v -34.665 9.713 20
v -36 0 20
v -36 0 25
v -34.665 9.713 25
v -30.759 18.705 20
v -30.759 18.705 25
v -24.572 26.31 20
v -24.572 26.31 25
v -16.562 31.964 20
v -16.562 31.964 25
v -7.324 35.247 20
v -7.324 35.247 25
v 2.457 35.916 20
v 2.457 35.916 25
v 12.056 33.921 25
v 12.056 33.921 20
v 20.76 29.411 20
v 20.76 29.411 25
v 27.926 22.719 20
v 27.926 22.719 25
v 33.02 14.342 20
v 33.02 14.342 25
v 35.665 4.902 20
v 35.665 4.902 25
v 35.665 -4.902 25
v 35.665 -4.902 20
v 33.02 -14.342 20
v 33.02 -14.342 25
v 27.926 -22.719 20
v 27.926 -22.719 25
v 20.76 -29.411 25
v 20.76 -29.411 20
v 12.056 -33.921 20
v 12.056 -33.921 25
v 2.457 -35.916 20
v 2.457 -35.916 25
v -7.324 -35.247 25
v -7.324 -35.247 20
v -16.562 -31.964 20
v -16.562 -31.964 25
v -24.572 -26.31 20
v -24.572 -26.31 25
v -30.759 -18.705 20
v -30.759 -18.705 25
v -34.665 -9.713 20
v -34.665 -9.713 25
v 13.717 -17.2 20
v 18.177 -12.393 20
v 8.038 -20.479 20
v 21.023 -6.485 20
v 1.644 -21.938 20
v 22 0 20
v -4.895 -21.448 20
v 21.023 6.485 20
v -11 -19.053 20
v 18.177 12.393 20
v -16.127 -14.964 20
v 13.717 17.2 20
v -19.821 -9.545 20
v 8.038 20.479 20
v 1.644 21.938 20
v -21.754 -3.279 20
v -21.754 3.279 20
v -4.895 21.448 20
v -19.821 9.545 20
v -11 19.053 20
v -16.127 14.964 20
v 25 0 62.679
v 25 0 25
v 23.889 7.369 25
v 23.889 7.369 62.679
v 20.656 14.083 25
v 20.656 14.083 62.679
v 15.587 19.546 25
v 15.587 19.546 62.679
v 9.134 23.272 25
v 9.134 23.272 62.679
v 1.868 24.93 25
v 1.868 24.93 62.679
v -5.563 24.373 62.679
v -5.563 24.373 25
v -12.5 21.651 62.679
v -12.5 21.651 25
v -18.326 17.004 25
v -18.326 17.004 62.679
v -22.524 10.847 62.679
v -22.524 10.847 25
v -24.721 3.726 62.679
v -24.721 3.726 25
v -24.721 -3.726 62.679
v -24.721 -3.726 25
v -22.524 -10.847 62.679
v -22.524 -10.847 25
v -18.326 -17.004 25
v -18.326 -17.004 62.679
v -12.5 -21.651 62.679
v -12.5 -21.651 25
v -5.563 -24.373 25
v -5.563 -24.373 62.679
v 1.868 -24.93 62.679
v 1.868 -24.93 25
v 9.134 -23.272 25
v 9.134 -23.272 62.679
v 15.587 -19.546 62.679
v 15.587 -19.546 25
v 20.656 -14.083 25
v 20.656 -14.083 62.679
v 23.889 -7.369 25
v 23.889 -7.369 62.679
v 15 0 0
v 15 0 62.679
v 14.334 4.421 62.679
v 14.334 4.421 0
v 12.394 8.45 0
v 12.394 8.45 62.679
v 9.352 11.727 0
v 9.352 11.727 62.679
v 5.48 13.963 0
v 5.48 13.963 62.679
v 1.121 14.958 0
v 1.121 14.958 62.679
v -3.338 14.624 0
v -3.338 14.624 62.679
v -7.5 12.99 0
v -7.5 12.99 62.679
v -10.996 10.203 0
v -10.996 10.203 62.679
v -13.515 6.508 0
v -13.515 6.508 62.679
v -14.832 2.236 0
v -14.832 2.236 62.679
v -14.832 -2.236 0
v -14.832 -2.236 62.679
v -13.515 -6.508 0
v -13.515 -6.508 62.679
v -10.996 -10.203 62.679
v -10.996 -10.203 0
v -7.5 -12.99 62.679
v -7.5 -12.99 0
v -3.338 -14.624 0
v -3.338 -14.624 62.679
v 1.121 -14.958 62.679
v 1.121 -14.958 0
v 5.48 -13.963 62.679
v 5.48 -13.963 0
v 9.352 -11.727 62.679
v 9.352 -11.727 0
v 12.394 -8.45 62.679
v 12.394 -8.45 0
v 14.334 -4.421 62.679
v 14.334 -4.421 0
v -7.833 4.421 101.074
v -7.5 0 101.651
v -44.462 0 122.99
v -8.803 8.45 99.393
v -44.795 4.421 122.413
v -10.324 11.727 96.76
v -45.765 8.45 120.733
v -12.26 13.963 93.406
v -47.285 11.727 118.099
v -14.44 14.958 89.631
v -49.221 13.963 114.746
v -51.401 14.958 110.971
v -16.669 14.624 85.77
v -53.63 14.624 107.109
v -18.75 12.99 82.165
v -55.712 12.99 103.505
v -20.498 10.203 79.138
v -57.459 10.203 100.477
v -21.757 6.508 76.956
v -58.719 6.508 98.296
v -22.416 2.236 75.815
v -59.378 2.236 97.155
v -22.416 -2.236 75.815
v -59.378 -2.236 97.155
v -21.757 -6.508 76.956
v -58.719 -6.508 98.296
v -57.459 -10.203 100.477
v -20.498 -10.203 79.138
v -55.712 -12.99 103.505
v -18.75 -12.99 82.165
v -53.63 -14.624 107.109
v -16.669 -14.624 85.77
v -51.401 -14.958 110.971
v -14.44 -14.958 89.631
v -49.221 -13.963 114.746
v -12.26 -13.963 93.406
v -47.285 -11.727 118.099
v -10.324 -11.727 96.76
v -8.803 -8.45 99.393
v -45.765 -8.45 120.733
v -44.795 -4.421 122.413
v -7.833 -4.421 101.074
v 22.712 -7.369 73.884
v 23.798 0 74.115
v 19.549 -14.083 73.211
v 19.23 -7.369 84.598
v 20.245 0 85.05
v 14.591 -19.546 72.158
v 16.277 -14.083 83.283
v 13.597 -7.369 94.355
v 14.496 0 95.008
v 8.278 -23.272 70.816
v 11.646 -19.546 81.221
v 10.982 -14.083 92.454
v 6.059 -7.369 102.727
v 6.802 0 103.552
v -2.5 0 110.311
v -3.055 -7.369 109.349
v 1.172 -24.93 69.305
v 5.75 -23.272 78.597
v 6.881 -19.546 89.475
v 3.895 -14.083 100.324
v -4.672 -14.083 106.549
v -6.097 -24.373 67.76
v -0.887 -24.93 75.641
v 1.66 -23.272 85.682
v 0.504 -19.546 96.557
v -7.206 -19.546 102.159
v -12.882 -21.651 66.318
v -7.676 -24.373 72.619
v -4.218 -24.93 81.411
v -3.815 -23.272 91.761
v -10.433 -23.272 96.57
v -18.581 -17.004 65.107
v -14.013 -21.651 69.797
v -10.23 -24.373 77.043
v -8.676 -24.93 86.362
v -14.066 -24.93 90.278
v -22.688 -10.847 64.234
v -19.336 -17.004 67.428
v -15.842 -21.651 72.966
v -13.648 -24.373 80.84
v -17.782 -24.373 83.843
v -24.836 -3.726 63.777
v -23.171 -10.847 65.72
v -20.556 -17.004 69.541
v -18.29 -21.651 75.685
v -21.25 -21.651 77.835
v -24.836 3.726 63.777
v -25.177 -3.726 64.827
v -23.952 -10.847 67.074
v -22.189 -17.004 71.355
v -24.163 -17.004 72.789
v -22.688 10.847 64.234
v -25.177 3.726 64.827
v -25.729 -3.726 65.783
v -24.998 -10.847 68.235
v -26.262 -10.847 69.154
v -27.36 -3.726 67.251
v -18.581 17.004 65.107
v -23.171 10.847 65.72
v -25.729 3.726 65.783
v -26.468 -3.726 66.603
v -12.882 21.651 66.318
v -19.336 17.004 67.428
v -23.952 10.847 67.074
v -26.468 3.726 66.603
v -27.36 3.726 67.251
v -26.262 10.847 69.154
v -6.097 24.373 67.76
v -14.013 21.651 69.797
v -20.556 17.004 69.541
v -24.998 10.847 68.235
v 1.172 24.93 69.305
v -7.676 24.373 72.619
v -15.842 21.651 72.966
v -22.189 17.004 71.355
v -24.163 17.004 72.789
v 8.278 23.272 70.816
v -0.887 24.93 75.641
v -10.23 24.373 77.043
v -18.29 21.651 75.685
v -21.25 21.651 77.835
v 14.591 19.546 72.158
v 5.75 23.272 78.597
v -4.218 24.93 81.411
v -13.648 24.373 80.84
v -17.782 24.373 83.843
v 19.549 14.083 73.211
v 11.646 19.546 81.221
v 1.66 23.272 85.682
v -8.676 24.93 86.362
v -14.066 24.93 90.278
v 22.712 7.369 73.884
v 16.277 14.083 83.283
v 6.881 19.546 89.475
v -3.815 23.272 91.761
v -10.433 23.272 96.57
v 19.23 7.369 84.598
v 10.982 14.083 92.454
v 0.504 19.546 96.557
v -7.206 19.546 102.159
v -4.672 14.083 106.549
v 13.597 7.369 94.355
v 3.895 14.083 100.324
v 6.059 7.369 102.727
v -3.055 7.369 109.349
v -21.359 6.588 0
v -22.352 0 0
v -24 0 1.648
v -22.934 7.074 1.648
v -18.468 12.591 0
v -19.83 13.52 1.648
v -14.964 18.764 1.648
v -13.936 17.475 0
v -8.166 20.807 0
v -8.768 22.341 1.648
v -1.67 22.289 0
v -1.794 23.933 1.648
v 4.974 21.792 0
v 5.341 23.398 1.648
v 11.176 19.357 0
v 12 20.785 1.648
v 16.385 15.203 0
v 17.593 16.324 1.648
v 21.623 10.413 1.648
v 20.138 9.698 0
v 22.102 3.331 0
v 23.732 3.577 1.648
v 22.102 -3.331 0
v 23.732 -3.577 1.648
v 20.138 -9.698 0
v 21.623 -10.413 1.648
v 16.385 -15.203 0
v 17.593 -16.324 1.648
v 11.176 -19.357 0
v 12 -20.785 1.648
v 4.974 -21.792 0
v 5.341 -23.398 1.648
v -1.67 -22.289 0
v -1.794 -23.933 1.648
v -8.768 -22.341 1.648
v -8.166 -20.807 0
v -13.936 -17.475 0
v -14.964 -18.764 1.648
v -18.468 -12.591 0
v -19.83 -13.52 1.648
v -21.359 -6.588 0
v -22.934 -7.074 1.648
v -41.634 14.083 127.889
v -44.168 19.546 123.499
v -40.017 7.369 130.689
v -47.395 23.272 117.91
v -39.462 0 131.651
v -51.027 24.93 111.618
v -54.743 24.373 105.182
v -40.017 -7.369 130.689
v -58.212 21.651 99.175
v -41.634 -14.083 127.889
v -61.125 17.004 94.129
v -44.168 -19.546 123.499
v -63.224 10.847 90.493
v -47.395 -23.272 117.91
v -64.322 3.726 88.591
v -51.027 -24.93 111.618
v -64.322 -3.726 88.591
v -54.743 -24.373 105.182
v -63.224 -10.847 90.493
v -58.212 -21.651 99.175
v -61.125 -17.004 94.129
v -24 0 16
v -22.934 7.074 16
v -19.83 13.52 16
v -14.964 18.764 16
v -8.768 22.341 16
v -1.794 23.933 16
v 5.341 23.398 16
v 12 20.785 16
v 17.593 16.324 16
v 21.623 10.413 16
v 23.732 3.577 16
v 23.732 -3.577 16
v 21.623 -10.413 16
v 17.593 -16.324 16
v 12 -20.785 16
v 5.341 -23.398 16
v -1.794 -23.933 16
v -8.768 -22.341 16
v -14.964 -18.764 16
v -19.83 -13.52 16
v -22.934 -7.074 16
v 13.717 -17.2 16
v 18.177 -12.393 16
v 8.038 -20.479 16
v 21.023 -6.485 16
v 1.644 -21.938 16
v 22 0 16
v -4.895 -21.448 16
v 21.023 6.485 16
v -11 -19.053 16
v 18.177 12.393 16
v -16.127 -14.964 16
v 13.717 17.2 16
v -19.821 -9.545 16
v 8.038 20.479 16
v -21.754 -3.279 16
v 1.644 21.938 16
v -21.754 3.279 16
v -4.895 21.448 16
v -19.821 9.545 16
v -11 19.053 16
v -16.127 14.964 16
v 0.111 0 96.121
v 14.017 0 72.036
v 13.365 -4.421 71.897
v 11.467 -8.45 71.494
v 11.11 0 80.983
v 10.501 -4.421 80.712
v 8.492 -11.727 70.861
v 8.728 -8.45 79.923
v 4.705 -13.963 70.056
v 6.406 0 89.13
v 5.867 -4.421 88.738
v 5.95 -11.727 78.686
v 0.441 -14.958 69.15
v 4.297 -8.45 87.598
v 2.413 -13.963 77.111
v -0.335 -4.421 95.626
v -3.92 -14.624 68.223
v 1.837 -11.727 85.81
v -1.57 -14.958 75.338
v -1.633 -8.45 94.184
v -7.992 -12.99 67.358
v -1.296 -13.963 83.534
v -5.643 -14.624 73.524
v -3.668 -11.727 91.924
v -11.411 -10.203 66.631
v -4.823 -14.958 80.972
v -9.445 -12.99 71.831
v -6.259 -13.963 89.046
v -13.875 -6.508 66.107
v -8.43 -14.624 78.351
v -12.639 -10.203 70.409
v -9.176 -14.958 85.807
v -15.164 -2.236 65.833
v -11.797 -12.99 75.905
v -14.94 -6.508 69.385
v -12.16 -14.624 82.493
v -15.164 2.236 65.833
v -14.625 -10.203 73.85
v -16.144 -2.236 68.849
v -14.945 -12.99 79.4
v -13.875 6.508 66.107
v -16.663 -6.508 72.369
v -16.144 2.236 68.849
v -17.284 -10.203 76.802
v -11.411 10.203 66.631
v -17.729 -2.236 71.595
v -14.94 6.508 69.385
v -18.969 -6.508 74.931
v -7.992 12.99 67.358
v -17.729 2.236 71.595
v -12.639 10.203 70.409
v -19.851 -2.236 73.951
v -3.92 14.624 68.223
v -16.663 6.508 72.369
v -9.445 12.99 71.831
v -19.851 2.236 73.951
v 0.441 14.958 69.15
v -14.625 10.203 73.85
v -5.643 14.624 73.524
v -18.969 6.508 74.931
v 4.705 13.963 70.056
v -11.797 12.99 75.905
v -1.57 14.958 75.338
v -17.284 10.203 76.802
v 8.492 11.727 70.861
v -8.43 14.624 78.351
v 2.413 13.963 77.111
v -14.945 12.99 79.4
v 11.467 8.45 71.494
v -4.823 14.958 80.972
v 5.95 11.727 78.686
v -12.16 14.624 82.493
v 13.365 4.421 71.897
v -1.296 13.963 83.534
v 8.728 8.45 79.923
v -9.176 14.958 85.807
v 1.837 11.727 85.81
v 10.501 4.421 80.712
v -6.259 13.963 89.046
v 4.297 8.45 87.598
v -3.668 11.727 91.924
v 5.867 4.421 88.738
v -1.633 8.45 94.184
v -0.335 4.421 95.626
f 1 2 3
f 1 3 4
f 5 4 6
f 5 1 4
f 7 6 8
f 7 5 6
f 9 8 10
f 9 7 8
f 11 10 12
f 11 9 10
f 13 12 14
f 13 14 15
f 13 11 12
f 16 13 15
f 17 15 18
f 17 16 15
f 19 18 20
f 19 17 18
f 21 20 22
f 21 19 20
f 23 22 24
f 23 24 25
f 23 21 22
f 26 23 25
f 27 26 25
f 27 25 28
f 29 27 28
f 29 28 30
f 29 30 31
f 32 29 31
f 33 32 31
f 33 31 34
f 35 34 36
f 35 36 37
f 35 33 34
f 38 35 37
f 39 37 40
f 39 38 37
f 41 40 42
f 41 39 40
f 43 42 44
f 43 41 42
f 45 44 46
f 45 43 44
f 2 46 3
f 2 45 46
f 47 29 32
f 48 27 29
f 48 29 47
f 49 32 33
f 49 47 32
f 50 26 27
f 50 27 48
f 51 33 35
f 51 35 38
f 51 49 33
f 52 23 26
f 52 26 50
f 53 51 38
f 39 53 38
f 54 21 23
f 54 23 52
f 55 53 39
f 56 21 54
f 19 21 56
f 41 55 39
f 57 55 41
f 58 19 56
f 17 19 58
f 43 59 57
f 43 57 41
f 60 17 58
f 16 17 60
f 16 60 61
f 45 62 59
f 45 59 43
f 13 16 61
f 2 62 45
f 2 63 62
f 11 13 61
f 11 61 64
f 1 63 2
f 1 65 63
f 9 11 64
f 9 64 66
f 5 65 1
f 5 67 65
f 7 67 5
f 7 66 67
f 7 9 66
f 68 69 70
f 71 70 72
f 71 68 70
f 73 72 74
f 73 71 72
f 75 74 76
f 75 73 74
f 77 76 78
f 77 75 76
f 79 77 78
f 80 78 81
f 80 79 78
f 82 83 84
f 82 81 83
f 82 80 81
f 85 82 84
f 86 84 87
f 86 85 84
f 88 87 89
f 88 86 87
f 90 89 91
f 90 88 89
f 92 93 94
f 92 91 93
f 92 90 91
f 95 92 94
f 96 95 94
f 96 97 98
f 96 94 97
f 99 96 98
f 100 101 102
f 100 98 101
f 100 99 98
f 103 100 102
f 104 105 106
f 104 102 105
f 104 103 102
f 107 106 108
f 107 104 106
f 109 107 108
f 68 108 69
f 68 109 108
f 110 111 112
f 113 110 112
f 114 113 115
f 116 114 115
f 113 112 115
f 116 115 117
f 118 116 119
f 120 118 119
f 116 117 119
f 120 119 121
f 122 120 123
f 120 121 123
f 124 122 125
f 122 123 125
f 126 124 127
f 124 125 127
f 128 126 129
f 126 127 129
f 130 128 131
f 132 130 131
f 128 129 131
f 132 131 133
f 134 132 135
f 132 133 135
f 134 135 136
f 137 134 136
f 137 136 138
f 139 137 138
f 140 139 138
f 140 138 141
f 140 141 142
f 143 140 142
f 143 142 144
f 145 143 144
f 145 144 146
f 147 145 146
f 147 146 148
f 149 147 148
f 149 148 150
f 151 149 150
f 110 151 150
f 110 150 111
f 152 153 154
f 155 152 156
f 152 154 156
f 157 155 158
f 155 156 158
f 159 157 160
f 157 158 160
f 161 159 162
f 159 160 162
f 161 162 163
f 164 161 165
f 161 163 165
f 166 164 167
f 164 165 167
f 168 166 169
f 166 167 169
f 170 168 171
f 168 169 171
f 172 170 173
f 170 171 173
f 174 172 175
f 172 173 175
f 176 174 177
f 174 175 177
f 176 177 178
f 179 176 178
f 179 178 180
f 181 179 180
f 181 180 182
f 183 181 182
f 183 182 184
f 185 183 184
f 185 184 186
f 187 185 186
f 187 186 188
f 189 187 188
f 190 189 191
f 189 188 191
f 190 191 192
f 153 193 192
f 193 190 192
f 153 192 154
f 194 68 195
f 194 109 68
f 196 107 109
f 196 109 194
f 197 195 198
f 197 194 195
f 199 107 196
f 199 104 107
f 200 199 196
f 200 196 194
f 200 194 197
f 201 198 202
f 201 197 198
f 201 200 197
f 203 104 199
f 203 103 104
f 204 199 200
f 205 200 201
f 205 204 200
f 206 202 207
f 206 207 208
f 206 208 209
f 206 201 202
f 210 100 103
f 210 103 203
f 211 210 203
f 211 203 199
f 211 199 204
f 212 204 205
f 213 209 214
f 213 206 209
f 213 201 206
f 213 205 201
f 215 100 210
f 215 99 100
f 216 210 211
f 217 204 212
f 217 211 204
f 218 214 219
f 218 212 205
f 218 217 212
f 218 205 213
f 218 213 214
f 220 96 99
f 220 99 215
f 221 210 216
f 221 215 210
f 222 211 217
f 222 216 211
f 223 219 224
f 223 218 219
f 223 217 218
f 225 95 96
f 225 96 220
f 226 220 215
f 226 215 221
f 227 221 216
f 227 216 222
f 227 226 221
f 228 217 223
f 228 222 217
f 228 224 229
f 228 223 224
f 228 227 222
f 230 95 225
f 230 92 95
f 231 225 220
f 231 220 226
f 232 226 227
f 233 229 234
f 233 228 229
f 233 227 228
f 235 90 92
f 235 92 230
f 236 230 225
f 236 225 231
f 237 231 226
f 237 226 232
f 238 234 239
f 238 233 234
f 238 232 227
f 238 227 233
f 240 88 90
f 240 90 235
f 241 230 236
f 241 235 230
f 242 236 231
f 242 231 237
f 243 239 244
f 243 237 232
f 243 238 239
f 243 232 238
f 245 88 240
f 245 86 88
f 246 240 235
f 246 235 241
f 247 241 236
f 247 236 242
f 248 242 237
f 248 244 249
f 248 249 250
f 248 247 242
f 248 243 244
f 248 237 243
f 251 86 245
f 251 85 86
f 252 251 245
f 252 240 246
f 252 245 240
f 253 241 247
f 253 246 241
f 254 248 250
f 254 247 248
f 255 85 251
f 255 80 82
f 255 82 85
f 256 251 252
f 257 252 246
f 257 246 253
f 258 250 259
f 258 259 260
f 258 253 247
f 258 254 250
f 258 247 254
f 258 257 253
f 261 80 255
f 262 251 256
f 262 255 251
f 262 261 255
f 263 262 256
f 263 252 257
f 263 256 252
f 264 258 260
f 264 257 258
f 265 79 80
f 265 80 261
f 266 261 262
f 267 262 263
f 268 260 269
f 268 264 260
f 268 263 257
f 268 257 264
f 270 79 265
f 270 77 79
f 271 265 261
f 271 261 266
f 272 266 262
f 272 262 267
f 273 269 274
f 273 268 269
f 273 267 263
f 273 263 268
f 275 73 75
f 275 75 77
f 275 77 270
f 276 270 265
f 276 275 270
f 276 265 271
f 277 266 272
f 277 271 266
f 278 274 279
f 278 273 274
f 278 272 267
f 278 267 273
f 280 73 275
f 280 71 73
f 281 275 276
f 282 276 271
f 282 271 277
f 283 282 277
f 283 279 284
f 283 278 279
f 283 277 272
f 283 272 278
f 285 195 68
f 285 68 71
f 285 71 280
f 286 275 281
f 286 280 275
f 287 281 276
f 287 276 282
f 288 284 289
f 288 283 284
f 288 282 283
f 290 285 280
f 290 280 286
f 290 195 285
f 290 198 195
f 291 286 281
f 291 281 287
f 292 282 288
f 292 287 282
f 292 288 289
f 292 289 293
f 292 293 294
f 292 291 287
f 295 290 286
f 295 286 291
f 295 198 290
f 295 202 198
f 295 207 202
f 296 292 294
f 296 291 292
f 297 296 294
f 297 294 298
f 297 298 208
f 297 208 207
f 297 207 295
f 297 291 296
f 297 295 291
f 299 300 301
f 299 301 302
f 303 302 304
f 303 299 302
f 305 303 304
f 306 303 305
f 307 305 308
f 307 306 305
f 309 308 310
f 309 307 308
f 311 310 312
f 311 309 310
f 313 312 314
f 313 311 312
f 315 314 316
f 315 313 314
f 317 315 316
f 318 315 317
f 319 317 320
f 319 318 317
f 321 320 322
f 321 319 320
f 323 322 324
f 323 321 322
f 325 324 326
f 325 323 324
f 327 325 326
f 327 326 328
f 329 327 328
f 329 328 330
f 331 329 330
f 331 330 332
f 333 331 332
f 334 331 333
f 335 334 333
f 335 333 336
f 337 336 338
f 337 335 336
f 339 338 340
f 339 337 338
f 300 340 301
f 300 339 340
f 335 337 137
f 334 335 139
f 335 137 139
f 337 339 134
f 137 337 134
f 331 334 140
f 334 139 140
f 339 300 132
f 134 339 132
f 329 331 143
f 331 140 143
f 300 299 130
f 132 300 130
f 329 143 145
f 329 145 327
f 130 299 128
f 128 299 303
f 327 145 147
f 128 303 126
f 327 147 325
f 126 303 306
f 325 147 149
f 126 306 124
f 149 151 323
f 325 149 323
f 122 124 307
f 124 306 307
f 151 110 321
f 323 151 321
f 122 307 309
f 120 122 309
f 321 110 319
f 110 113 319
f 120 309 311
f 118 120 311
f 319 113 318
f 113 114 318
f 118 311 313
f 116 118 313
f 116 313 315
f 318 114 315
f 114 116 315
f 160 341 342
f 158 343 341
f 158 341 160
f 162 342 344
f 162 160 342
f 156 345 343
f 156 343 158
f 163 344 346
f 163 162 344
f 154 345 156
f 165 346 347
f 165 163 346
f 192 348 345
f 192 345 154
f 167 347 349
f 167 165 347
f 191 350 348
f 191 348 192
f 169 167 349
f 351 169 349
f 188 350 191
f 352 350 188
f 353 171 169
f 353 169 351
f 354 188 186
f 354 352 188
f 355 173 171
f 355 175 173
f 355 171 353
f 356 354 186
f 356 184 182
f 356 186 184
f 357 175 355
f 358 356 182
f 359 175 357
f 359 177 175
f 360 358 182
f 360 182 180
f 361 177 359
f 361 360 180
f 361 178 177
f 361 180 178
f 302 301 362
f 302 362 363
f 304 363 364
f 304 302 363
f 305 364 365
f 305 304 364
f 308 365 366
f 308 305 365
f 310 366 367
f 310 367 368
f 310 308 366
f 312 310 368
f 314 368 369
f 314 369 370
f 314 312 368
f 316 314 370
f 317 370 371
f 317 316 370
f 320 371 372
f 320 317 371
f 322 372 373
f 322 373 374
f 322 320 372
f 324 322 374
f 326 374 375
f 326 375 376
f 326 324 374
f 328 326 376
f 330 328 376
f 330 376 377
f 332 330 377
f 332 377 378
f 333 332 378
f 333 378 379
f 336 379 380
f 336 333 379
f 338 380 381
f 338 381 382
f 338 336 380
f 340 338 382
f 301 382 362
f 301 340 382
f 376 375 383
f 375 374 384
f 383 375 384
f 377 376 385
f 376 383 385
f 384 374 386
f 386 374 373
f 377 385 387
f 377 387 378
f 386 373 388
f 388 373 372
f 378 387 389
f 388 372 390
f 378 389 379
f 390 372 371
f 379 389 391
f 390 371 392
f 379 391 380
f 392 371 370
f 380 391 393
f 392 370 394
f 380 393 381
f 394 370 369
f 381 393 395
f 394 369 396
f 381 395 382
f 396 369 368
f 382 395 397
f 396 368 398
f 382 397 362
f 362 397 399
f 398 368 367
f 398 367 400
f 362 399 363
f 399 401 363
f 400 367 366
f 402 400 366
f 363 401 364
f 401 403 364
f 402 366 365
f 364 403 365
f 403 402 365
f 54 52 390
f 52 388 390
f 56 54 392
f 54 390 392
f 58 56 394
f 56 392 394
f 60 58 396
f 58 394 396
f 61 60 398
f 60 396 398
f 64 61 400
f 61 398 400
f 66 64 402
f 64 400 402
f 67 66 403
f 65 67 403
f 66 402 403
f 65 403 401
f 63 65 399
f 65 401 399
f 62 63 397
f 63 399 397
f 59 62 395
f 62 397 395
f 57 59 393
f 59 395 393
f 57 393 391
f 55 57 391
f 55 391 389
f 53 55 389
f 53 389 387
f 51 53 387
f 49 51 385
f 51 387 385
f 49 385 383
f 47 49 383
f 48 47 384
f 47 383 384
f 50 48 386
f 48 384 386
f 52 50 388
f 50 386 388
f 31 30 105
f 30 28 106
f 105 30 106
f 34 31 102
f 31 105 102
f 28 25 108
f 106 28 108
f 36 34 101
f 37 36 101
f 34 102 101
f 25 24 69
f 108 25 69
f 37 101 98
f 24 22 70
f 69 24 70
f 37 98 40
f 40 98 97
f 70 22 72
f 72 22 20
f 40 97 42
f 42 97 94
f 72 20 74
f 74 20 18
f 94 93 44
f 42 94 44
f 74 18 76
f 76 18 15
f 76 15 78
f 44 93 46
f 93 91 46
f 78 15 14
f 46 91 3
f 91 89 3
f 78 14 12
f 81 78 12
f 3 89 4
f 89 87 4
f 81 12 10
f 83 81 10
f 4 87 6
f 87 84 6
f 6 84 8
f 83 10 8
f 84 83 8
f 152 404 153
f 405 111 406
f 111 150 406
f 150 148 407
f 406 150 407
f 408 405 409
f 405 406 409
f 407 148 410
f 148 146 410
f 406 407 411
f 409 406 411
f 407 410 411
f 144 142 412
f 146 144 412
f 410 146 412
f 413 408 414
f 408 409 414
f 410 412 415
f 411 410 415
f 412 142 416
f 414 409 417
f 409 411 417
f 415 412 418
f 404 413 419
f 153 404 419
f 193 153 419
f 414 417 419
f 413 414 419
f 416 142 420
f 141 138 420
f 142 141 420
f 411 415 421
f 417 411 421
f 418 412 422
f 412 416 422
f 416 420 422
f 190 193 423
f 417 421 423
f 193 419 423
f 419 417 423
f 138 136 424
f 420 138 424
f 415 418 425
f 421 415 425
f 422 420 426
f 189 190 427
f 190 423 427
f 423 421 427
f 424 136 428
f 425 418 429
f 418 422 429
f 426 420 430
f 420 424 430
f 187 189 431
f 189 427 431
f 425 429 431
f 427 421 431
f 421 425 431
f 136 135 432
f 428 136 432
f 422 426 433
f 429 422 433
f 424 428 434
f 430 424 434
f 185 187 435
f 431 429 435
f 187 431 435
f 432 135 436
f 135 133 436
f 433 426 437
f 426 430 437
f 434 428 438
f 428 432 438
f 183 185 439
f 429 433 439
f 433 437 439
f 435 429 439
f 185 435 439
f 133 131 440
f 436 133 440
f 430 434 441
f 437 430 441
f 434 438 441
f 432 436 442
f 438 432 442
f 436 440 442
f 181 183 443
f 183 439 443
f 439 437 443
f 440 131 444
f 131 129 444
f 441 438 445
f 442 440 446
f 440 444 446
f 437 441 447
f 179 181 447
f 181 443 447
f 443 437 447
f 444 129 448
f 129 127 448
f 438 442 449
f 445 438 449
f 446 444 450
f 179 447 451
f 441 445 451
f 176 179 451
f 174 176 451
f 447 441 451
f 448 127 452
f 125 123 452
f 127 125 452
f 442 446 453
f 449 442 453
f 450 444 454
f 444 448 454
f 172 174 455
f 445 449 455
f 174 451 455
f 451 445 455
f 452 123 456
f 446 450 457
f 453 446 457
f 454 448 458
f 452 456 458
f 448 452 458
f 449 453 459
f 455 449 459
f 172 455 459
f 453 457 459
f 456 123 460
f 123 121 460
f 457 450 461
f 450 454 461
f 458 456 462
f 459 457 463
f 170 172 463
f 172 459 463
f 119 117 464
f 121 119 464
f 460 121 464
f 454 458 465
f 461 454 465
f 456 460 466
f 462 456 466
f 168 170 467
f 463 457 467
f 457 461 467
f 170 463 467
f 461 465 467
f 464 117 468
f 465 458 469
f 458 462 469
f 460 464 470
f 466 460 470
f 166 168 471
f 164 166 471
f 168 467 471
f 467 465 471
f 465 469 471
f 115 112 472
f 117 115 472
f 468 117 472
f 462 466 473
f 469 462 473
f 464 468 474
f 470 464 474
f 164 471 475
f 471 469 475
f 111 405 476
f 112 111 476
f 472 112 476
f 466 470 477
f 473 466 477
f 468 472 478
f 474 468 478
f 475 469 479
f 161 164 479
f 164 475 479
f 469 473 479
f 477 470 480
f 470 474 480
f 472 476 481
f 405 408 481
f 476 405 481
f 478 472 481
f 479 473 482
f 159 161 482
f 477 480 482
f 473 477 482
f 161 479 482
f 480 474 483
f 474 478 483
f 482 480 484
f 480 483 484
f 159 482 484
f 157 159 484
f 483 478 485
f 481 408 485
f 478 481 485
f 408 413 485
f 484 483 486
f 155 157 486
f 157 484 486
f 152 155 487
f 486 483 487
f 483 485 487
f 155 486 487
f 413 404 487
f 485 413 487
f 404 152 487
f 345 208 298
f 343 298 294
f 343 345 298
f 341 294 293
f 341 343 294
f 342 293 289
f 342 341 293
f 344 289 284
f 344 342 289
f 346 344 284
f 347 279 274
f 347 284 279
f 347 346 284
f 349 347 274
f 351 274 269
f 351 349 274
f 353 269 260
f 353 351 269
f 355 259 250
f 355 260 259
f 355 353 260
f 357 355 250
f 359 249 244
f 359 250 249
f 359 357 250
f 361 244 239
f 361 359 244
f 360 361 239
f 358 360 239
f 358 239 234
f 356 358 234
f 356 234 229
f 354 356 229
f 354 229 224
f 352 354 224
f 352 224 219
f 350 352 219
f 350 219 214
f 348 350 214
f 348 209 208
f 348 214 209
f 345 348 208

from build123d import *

# Parameters (mm, degrees)
SKETCH_1_R          = 25
SKETCH_1_R_2        = 15
EXTRUDE_START       = -20
SKETCH_3_R          = 36
SKETCH_3_R_2        = 25
EXTRUDE_2_DEPTH     = 5
SKETCH_4_W          = 10
SKETCH_4_H          = 4
CUT_EXTRUDE_1_REACH = 133.651
SKETCH_5_R          = 25
SKETCH_5_R_2        = 24
CHAMFER_1_SIZE      = 1.648


with BuildPart() as part:
    # По траектории1: sweep along a path in Эскиз2
    with BuildLine(Plane(origin=(0, 0, 0), x_dir=(1, 0, 0), z_dir=(0, 1, 0))) as sweep_1_path:
        Line((0, 0), (0, -62.679491924))
        ThreePointArc((0, -62.679491924), (-4.019237886, -77.679491924), (-15, -88.660254038))
        Line((-15, -88.660254038), (-51.961524227, -110))
    # Эскиз1 → По траектории1 (sweep)
    with BuildSketch(Plane.XY):
        Circle(SKETCH_1_R)
        Circle(SKETCH_1_R_2, mode=Mode.SUBTRACT)
    sweep(path=sweep_1_path.line)

    # Эскиз3 → Бобышка-Вытянуть2 (add)
    with BuildSketch(Plane(origin=(0, 0, 0), x_dir=(-1, 0, 0), z_dir=(0, 0, -1)).offset(EXTRUDE_START)):
        Circle(SKETCH_3_R)
        Circle(SKETCH_3_R_2, mode=Mode.SUBTRACT)
    extrude(amount=-EXTRUDE_2_DEPTH)

    # Эскиз4 → Вырез-Повернуть1 (revolve, cut)
    with BuildSketch(Plane(origin=(0, 0, 0), x_dir=(1, 0, 0), z_dir=(0, 1, 0))):
        with Locations((27, -18)):
            Rectangle(SKETCH_4_W, SKETCH_4_H)
    revolve(axis=Axis((0, 0, 0), (0, 0, 1)), mode=Mode.SUBTRACT)

    # Эскиз5 → Вырез-Вытянуть1 (cut, up to next)
    with BuildSketch(Plane(origin=(0, 0, 0), x_dir=(-1, 0, 0), z_dir=(0, 0, -1)), mode=Mode.PRIVATE) as cut_extrude_1_sk1:
        Circle(SKETCH_5_R)
        Circle(SKETCH_5_R_2, mode=Mode.SUBTRACT)
    cut_extrude_1_tool1 = extrude(cut_extrude_1_sk1.sketch, amount=-CUT_EXTRUDE_1_REACH, mode=Mode.PRIVATE) & part.part
    add(cut_extrude_1_tool1.solids().sort_by_distance((24.292893, 0, 0))[0], mode=Mode.SUBTRACT)

    # Фаска1
    chamfer_1_edges = [part.edges().sort_by_distance(p)[0] for p in [
        (24, 0, 0),
    ]]
    chamfer(chamfer_1_edges, length=CHAMFER_1_SIZE)


solid = part.part
